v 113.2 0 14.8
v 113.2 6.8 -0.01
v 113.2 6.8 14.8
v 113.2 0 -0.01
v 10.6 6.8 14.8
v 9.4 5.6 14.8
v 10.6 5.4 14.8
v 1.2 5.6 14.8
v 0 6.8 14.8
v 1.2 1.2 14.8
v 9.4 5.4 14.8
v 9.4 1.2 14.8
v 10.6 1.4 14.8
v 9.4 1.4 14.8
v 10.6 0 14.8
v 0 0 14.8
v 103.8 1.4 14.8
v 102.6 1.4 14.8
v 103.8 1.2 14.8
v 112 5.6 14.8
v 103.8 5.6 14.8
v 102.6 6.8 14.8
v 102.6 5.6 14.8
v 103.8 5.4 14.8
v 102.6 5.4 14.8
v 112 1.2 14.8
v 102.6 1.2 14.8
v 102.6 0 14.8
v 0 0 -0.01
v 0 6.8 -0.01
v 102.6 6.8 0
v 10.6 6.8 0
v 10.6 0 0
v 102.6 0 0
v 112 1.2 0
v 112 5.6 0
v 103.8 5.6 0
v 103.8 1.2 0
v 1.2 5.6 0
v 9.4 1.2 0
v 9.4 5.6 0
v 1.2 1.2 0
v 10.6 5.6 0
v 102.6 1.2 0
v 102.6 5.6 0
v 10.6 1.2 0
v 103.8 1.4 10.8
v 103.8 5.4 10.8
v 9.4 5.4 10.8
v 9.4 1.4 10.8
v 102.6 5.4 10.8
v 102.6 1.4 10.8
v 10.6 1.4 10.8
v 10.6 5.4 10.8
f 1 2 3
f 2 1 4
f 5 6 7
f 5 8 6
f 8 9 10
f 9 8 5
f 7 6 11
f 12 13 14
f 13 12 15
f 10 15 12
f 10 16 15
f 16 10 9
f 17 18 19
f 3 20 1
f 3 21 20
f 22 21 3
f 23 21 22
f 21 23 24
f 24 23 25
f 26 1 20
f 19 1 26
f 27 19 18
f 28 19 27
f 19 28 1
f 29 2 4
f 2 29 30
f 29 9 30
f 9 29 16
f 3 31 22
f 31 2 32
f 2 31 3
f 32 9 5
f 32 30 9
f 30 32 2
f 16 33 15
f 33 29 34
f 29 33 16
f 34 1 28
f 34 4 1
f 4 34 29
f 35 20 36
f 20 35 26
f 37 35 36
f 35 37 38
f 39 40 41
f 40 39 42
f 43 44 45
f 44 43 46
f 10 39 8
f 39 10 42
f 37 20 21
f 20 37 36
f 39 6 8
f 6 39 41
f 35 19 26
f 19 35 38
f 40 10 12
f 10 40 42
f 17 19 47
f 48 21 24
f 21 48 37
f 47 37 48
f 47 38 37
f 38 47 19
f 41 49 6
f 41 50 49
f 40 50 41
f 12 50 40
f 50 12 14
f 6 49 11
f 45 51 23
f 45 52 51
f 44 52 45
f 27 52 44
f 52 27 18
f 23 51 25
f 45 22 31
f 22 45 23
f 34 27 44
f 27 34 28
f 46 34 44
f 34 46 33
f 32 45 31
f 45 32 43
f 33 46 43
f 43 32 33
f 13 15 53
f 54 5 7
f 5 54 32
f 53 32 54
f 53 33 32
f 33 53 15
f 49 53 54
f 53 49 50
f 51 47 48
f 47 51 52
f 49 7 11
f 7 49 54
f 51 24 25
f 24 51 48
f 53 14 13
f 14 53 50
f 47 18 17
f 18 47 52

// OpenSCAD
// file: ../Base/Boxes.scad
// Fischertechnik Box Foundation
// Pre-designed Boxes

use <Constants.scad>

include <PlacementOptions.scad>

box190Width = 190;
box190Depth = 130;
box130Width = 130;
box130Depth = 95;
boxUsageHeight = 33.9;
boxWallThickness = 2.4;
boxBaseThickness = 1.0;

// getBoxWallThickness()
// Gets the wall thickness of a Fischertechnik Box

function getBoxWallThickness() = boxWallThickness;

// Gets the usable height of a fischertechnik box
function getBoxUsageHeight() = boxUsageHeight;

// Gets the thickness of the Fischertechnik box base.
function getBoxBaseThickness() = boxBaseThickness;

// Gets the usable inner space of a Box 190 as an x/y-list
function getBox190Space() = [
    box190Width - 2*getBoxWallThickness(), 
    box190Depth - 2*getBoxWallThickness() ];

// Imports the Fischertechnik empty box 130x190 mm and places it at position 0,0
// 190x130 are the outer sizes, the inner space is slightly smaller. Use getBox190Space() to get the inner sizes.
// This module needs the STL file "Fischertechnik Box 130x190.stl" in the library path.
// The box is positioned that the usable inner space is at the 0,0,0 position. The

module Box190() {
    translate([-getBoxWallThickness(),-getBoxWallThickness(),-getBoxBaseThickness()])
        import("Fischertechnik Box 130x190.stl", convexity=3);
}

// Gets the usable inner space of a Box 130 as an x/y-list
function getBox130Space() = [
    box130Width - 2*getBoxWallThickness(), 
    box130Depth - 2*getBoxWallThickness() ];

// Imports the Fischertechnik empty box 95x130 mm and places it at position 0,0
// 190x130 are the outer sizes, the inner space is slightly smaller. Use getBox190Space() to get the inner sizes.
// This module needs the STL file "Fischertechnik Box 95x130.stl" in the library path.
// The box is positioned that the usable inner space is at the 0,0,0 position. The

module Box130() {
    translate([-getBoxWallThickness(),-getBoxWallThickness(),-getBoxBaseThickness()])
        import("Fischertechnik Box 95x130.stl", convexity=3);
}

// Creates a web at the specified box walls
// corner 0 = LowerLeft, 1 = UpperLeft, 2 = UpperRight, 3 = LowerRight
// side 0 = LeftOfCorner, 1 = RightOfCorner
// distance = Distance in mm from the corner
// box = inner width and depth of the box (default: Box 190)
// webWidth = length of the web (default is 3 mms)
// webThickness = thickness of the web (default is 1 mm)

module BoxWeb(corner, side, distance, box=getBox190Space(), webWidth=3, webThickness=1.0) {
    sink = getBoxWallThickness()/2;

    width = (corner % 2 == 0) ? 
            (side == LeftOfCorner ? webWidth : webThickness) :
            (side == LeftOfCorner ? webThickness : webWidth);

    depth = (corner % 2 == 0) ? 
            (side == RightOfCorner ? webWidth : webThickness) :
            (side == RightOfCorner ? webThickness : webWidth);
    
    xDiff = corner == LowerLeft ? 
                (side == LeftOfCorner ? -sink : distance) :
            (corner == UpperLeft ?                
                (side == LeftOfCorner ? distance : -sink) :
            (corner == UpperRight ?
                (side == LeftOfCorner ? box.x-webWidth+sink : box.x-distance-webThickness) :
                (side == LeftOfCorner ? box.x-distance-webThickness: box.x-webWidth+sink)));

    yDiff = corner == LowerLeft ? 
                (side == RightOfCorner ? -sink : distance) :
            (corner == UpperLeft ?
                (side == RightOfCorner ? box.y-distance : box.y-webWidth+sink) :
            (corner == UpperRight ?
                (side == RightOfCorner ? box.y-webWidth+sink : box.y-distance) :
                (side == RightOfCorner ? distance : -sink)));
    
    translate([xDiff, yDiff, -getExcess()])
        cube([width, depth, boxUsageHeight + 2*getExcess()]);
}
// file: ../Base/Rotation.scad
// Fischertechnik Box Foundation
// Geometry Helpers Rotation

include <PlacementOptions.scad>

// getRotatedSpace(space, rotation=NoRotation)
// Rotates the space dependent on the specified rotation

function getRotatedSpace(space, rotation=NoRotation) = [
    (rotation == Rotate90 || rotation == Rotate270) ? space.y : space.x,
    (rotation == Rotate90 || rotation == Rotate270) ? space.x : space.y
];

// Rotates the given space around the fixed left lower corner
// space = the space the children needs as width/depth list [width,depth]
// rotation = 0 Rotate0 degrees, 1 Rotate90 degrees, 2 Rotate180 degrees, 3 Rotate270 degrees (equivalent to -90)

module RotateFix(space, rotation=Rotate0) {
    dy = (rotation == Rotate0 || rotation == Rotate270) ? 0 :
        (rotation == Rotate90) ? space.x :
        space.y;
    dx = (rotation < Rotate180) ? 0 :
        (rotation == Rotate180) ? space.x :
        space.y;
    
    translate([dx, dy, 0])
        rotate([0, 0, rotations[rotation]])
            children();
}
// file: ../Base/Alignment.scad
// Fischertechnik Box Foundation
// Geometry Helpers Alignment

include <PlacementOptions.scad>

// getAlignedX(elementWidth, spaceWidth, align=AlignRight, offset=0)
// Gets the aligned X offset of an element with the given
// width in the given space.
// elementWidth = The width of the element to positon
// spaceWidth = The space where the element should be aligned
// align = 0 AlignLeft, 1 AlignCenter, 2 AlignRight
// offset = an optional offset from the aligned position. When
// aligned left or centered, then positive values are in X direction.
// When aligned right then positive values are in negative X direction.

function getAlignedX(elementWidth, spaceWidth, align=AlignRight, offset=0) =
    (align == AlignLeft) ?
        offset :
        ((align == AlignCenter) ?
        (spaceWidth - elementWidth)/2 + offset :
        spaceWidth - offset - elementWidth);

// getAlignedY(elementDepth, spaceDepth, align=AlignTop, offset=0)
// Gets the aligned Y offset of an element with the given
// depth in the given space.
// elementDepth = The depth of the element to positon
// spaceDepth = The space where the element should be aligned
// align = 0 AlignBottom, 1 AlignCenter, 2 AlignTop
// offset = an optional offset from the aligned position. When
// aligned bottom or centered, then positive values are in Y direction.
// When aligned top then positive values are in negative Y direction.

function getAlignedY(elementDepth, spaceDepth, align=AlignTop, offset=0) =
    (align == AlignBottom) ?
        offset :
        ((align == AlignCenter) ?
        (spaceDepth - elementDepth)/2 + offset :
        spaceDepth - offset - elementDepth);
// file: ../Base/PlacementOptions.scad
// Fischertechnik Box Foundation
// Placement Options

// Alignment
NoAlign = 0;
AlignLeft = 1;
AlignBottom = 2;
AlignCenter = 3;
AlignRight = 4;
AlignTop = 5;

// Element rotation degree steps
rotations = [0, -90, -180, -270];

// Rotation
NoRotation = 0;
Rotate0 = 0;
Rotate90 = 1;
Rotate180 = 2;
Rotate270 = 3;

// Docking (seen from above)
NoDock = -1;
DockLeft = 0;
DockTop = 1;
DockRight = 2;
DockCorner = 2;
DockBottom = 3;

// Web corners
LowerLeft = 0;
UpperLeft = 1;
UpperRight = 2;
LowerRight = 3;

// Web position relative to corner
LeftOfCorner = 0;
RightOfCorner = 1;
// file: ../Base/Placement.scad
// Fischertechnik Box Foundation
// Geometry Helpers Placement

use <Constants.scad>
use <Alignment.scad>
use <Rotation.scad>
use <Boxes.scad>

include <PlacementOptions.scad>

// Place(x=0, y=0, elementSpace=[0,0], alignX=AlignLeft, alignY=AlignBottom, rotation=Rotate0, boxSpace=getBox190Space())
// Places the child at the specified position
// y = Y-Position. This is a relative position when an X aligment is specified.
// x = X-Position. This is a relative position when an Y aligment is specified.
// elementSpace = space of the element to be placed [x,y]
// alignX = -1=NoAlign, 0 AlignLeft, 1 AlignCenter, 3 AlignRight (elementSpace and boxSpace required!)
// alignY = -1=NoAlign, 2 AlignBottom, 1 AlignCenter, 4 AlignTop (elementSpace and boxSpace required!)
// rotation = 0 Rotate0 0 degrees, 1 Rotate90 90 degrees, 
// 2 Rotate180 180 degrees, 3 Rotate270 270 degrees (equivalent to -90)
// boxSpace = Inner space of the box where the placement occurs [x,y] - default is Box 190x130 inner space

module Place(x=0, y=0, elementSpace=[0,0], 
  alignX=AlignLeft, alignY=AlignBottom, 
  rotation=NoRotation, boxSpace=getBox190Space()) {

    module Position(x, y, space, rotation=Rotate0) {
        translate([x, y, 0])
            RotateFix(space, rotation)
                children(0);
    }

    space = getRotatedSpace(elementSpace, rotation);
    alignedX = getAlignedX(space.x, boxSpace.x, alignX, x);
    alignedY = getAlignedY(space.y, boxSpace.y, alignY, y);
    Position(alignedX, alignedY, elementSpace, rotation)
        children(0);
}

// Center(space=getBox130Space(), elementSpace=[0,0])
// space = Space where the children is centered. For cylinder use centered=true and no elementSpace.
// elementSpace = space of the element to be centered [x,y]

module Center(space=getBox190Space(), elementSpace=[0,0]) {
    translate([(space.x - elementSpace.x) / 2, (space.y - elementSpace.y) / 2])
        children(0);
}

// CenterHorizontal(width=0, y=0, offset=0, space=getBox130Space())
// space = Space where the children is centered. For cylinder use centered=true and no elementSpace.
// elementSpace = space of the element to be centered [x,y]

module CenterHorizontal(width=0, y=0, offset=0, space=getBox190Space()) {
    translate([(space.x - width) / 2 + offset, y])
        children(0);
}

// CenterVertical(depth=0, x=0, offset=0, space=getBox130Space())
// space = Space where the children is centered. For cylinder use centered=true and no elementSpace.
// elementSpace = space of the element to be centered [x,y]

module CenterVerticalal(depth=0, x=0, offset=0, space=getBox190Space()) {
    translate([x, (space.y - depth) / 2 + offset])
        children(0);
}
// file: ../Base/Constants.scad
// Fischertechnik Box Foundation
// Constants

// Constant values necessary for multiple elements

// Base constants
dividerThickness = 1.2;
excess = 0.01;
fragments = 90;
tolerance = 0.8;

// Gets the thickness of a divider 
function getDividerThickness() = dividerThickness;

// Gets the excess that is used to merge walls into each other
function getExcess() = excess;

// Gets amount of fragments of a cylinder
function getFragments() = fragments;

// Gets the inner tolerance of a frame to each side
function getTolerance() = tolerance;


// Fischertechnik specific constants
axisDiameter = 4;
axisBottomDiameter = axisDiameter + 1;
standardEdgeDistance = 2.5;
standardWebDistance = 11.5;
standardCornerLength = 15;
tubeWallFactor = 1.6;

// Gets axis diameter
function getAxisDiameter() = axisDiameter;

// Gets axis bottom diameter for thicker part at the bottom
function getAxisBottomDiameter() = axisBottomDiameter;

// gets the standard distance to the wall of the box for dockable frames with webs
function getStandardEdgeDistance() = standardEdgeDistance;

// gets the standard distance of each web to the corner of the dockable frame
function getStandardWebDistance() = standardWebDistance;

// gets the standard length of the corner walls of a dockable frame
function getStandardCornerLength() = standardCornerLength;

// gets the wall thickness of a tube.
function getTubeWallThickness() = tubeWallFactor * getDividerThickness();
// main file
// Fischertechnik Box Library
// Frame for single 110 mm Axis
// 31031

use <../Base/Constants.scad>
use <../ModelBase/Complex.scad>

length = 110;

// getFrameAxis110Space()
// Gets the width (.x) and depth (.y) of the axis frame.

function getFrameAxis110Space() = getFrameAxisSpace(length);

// FrameAxis110()
// Axis holder for a single 110 mm axis.

module FrameAxis110() {
    FrameAxis(length);
}

// Test
color("lightgray")
FrameAxis110();
